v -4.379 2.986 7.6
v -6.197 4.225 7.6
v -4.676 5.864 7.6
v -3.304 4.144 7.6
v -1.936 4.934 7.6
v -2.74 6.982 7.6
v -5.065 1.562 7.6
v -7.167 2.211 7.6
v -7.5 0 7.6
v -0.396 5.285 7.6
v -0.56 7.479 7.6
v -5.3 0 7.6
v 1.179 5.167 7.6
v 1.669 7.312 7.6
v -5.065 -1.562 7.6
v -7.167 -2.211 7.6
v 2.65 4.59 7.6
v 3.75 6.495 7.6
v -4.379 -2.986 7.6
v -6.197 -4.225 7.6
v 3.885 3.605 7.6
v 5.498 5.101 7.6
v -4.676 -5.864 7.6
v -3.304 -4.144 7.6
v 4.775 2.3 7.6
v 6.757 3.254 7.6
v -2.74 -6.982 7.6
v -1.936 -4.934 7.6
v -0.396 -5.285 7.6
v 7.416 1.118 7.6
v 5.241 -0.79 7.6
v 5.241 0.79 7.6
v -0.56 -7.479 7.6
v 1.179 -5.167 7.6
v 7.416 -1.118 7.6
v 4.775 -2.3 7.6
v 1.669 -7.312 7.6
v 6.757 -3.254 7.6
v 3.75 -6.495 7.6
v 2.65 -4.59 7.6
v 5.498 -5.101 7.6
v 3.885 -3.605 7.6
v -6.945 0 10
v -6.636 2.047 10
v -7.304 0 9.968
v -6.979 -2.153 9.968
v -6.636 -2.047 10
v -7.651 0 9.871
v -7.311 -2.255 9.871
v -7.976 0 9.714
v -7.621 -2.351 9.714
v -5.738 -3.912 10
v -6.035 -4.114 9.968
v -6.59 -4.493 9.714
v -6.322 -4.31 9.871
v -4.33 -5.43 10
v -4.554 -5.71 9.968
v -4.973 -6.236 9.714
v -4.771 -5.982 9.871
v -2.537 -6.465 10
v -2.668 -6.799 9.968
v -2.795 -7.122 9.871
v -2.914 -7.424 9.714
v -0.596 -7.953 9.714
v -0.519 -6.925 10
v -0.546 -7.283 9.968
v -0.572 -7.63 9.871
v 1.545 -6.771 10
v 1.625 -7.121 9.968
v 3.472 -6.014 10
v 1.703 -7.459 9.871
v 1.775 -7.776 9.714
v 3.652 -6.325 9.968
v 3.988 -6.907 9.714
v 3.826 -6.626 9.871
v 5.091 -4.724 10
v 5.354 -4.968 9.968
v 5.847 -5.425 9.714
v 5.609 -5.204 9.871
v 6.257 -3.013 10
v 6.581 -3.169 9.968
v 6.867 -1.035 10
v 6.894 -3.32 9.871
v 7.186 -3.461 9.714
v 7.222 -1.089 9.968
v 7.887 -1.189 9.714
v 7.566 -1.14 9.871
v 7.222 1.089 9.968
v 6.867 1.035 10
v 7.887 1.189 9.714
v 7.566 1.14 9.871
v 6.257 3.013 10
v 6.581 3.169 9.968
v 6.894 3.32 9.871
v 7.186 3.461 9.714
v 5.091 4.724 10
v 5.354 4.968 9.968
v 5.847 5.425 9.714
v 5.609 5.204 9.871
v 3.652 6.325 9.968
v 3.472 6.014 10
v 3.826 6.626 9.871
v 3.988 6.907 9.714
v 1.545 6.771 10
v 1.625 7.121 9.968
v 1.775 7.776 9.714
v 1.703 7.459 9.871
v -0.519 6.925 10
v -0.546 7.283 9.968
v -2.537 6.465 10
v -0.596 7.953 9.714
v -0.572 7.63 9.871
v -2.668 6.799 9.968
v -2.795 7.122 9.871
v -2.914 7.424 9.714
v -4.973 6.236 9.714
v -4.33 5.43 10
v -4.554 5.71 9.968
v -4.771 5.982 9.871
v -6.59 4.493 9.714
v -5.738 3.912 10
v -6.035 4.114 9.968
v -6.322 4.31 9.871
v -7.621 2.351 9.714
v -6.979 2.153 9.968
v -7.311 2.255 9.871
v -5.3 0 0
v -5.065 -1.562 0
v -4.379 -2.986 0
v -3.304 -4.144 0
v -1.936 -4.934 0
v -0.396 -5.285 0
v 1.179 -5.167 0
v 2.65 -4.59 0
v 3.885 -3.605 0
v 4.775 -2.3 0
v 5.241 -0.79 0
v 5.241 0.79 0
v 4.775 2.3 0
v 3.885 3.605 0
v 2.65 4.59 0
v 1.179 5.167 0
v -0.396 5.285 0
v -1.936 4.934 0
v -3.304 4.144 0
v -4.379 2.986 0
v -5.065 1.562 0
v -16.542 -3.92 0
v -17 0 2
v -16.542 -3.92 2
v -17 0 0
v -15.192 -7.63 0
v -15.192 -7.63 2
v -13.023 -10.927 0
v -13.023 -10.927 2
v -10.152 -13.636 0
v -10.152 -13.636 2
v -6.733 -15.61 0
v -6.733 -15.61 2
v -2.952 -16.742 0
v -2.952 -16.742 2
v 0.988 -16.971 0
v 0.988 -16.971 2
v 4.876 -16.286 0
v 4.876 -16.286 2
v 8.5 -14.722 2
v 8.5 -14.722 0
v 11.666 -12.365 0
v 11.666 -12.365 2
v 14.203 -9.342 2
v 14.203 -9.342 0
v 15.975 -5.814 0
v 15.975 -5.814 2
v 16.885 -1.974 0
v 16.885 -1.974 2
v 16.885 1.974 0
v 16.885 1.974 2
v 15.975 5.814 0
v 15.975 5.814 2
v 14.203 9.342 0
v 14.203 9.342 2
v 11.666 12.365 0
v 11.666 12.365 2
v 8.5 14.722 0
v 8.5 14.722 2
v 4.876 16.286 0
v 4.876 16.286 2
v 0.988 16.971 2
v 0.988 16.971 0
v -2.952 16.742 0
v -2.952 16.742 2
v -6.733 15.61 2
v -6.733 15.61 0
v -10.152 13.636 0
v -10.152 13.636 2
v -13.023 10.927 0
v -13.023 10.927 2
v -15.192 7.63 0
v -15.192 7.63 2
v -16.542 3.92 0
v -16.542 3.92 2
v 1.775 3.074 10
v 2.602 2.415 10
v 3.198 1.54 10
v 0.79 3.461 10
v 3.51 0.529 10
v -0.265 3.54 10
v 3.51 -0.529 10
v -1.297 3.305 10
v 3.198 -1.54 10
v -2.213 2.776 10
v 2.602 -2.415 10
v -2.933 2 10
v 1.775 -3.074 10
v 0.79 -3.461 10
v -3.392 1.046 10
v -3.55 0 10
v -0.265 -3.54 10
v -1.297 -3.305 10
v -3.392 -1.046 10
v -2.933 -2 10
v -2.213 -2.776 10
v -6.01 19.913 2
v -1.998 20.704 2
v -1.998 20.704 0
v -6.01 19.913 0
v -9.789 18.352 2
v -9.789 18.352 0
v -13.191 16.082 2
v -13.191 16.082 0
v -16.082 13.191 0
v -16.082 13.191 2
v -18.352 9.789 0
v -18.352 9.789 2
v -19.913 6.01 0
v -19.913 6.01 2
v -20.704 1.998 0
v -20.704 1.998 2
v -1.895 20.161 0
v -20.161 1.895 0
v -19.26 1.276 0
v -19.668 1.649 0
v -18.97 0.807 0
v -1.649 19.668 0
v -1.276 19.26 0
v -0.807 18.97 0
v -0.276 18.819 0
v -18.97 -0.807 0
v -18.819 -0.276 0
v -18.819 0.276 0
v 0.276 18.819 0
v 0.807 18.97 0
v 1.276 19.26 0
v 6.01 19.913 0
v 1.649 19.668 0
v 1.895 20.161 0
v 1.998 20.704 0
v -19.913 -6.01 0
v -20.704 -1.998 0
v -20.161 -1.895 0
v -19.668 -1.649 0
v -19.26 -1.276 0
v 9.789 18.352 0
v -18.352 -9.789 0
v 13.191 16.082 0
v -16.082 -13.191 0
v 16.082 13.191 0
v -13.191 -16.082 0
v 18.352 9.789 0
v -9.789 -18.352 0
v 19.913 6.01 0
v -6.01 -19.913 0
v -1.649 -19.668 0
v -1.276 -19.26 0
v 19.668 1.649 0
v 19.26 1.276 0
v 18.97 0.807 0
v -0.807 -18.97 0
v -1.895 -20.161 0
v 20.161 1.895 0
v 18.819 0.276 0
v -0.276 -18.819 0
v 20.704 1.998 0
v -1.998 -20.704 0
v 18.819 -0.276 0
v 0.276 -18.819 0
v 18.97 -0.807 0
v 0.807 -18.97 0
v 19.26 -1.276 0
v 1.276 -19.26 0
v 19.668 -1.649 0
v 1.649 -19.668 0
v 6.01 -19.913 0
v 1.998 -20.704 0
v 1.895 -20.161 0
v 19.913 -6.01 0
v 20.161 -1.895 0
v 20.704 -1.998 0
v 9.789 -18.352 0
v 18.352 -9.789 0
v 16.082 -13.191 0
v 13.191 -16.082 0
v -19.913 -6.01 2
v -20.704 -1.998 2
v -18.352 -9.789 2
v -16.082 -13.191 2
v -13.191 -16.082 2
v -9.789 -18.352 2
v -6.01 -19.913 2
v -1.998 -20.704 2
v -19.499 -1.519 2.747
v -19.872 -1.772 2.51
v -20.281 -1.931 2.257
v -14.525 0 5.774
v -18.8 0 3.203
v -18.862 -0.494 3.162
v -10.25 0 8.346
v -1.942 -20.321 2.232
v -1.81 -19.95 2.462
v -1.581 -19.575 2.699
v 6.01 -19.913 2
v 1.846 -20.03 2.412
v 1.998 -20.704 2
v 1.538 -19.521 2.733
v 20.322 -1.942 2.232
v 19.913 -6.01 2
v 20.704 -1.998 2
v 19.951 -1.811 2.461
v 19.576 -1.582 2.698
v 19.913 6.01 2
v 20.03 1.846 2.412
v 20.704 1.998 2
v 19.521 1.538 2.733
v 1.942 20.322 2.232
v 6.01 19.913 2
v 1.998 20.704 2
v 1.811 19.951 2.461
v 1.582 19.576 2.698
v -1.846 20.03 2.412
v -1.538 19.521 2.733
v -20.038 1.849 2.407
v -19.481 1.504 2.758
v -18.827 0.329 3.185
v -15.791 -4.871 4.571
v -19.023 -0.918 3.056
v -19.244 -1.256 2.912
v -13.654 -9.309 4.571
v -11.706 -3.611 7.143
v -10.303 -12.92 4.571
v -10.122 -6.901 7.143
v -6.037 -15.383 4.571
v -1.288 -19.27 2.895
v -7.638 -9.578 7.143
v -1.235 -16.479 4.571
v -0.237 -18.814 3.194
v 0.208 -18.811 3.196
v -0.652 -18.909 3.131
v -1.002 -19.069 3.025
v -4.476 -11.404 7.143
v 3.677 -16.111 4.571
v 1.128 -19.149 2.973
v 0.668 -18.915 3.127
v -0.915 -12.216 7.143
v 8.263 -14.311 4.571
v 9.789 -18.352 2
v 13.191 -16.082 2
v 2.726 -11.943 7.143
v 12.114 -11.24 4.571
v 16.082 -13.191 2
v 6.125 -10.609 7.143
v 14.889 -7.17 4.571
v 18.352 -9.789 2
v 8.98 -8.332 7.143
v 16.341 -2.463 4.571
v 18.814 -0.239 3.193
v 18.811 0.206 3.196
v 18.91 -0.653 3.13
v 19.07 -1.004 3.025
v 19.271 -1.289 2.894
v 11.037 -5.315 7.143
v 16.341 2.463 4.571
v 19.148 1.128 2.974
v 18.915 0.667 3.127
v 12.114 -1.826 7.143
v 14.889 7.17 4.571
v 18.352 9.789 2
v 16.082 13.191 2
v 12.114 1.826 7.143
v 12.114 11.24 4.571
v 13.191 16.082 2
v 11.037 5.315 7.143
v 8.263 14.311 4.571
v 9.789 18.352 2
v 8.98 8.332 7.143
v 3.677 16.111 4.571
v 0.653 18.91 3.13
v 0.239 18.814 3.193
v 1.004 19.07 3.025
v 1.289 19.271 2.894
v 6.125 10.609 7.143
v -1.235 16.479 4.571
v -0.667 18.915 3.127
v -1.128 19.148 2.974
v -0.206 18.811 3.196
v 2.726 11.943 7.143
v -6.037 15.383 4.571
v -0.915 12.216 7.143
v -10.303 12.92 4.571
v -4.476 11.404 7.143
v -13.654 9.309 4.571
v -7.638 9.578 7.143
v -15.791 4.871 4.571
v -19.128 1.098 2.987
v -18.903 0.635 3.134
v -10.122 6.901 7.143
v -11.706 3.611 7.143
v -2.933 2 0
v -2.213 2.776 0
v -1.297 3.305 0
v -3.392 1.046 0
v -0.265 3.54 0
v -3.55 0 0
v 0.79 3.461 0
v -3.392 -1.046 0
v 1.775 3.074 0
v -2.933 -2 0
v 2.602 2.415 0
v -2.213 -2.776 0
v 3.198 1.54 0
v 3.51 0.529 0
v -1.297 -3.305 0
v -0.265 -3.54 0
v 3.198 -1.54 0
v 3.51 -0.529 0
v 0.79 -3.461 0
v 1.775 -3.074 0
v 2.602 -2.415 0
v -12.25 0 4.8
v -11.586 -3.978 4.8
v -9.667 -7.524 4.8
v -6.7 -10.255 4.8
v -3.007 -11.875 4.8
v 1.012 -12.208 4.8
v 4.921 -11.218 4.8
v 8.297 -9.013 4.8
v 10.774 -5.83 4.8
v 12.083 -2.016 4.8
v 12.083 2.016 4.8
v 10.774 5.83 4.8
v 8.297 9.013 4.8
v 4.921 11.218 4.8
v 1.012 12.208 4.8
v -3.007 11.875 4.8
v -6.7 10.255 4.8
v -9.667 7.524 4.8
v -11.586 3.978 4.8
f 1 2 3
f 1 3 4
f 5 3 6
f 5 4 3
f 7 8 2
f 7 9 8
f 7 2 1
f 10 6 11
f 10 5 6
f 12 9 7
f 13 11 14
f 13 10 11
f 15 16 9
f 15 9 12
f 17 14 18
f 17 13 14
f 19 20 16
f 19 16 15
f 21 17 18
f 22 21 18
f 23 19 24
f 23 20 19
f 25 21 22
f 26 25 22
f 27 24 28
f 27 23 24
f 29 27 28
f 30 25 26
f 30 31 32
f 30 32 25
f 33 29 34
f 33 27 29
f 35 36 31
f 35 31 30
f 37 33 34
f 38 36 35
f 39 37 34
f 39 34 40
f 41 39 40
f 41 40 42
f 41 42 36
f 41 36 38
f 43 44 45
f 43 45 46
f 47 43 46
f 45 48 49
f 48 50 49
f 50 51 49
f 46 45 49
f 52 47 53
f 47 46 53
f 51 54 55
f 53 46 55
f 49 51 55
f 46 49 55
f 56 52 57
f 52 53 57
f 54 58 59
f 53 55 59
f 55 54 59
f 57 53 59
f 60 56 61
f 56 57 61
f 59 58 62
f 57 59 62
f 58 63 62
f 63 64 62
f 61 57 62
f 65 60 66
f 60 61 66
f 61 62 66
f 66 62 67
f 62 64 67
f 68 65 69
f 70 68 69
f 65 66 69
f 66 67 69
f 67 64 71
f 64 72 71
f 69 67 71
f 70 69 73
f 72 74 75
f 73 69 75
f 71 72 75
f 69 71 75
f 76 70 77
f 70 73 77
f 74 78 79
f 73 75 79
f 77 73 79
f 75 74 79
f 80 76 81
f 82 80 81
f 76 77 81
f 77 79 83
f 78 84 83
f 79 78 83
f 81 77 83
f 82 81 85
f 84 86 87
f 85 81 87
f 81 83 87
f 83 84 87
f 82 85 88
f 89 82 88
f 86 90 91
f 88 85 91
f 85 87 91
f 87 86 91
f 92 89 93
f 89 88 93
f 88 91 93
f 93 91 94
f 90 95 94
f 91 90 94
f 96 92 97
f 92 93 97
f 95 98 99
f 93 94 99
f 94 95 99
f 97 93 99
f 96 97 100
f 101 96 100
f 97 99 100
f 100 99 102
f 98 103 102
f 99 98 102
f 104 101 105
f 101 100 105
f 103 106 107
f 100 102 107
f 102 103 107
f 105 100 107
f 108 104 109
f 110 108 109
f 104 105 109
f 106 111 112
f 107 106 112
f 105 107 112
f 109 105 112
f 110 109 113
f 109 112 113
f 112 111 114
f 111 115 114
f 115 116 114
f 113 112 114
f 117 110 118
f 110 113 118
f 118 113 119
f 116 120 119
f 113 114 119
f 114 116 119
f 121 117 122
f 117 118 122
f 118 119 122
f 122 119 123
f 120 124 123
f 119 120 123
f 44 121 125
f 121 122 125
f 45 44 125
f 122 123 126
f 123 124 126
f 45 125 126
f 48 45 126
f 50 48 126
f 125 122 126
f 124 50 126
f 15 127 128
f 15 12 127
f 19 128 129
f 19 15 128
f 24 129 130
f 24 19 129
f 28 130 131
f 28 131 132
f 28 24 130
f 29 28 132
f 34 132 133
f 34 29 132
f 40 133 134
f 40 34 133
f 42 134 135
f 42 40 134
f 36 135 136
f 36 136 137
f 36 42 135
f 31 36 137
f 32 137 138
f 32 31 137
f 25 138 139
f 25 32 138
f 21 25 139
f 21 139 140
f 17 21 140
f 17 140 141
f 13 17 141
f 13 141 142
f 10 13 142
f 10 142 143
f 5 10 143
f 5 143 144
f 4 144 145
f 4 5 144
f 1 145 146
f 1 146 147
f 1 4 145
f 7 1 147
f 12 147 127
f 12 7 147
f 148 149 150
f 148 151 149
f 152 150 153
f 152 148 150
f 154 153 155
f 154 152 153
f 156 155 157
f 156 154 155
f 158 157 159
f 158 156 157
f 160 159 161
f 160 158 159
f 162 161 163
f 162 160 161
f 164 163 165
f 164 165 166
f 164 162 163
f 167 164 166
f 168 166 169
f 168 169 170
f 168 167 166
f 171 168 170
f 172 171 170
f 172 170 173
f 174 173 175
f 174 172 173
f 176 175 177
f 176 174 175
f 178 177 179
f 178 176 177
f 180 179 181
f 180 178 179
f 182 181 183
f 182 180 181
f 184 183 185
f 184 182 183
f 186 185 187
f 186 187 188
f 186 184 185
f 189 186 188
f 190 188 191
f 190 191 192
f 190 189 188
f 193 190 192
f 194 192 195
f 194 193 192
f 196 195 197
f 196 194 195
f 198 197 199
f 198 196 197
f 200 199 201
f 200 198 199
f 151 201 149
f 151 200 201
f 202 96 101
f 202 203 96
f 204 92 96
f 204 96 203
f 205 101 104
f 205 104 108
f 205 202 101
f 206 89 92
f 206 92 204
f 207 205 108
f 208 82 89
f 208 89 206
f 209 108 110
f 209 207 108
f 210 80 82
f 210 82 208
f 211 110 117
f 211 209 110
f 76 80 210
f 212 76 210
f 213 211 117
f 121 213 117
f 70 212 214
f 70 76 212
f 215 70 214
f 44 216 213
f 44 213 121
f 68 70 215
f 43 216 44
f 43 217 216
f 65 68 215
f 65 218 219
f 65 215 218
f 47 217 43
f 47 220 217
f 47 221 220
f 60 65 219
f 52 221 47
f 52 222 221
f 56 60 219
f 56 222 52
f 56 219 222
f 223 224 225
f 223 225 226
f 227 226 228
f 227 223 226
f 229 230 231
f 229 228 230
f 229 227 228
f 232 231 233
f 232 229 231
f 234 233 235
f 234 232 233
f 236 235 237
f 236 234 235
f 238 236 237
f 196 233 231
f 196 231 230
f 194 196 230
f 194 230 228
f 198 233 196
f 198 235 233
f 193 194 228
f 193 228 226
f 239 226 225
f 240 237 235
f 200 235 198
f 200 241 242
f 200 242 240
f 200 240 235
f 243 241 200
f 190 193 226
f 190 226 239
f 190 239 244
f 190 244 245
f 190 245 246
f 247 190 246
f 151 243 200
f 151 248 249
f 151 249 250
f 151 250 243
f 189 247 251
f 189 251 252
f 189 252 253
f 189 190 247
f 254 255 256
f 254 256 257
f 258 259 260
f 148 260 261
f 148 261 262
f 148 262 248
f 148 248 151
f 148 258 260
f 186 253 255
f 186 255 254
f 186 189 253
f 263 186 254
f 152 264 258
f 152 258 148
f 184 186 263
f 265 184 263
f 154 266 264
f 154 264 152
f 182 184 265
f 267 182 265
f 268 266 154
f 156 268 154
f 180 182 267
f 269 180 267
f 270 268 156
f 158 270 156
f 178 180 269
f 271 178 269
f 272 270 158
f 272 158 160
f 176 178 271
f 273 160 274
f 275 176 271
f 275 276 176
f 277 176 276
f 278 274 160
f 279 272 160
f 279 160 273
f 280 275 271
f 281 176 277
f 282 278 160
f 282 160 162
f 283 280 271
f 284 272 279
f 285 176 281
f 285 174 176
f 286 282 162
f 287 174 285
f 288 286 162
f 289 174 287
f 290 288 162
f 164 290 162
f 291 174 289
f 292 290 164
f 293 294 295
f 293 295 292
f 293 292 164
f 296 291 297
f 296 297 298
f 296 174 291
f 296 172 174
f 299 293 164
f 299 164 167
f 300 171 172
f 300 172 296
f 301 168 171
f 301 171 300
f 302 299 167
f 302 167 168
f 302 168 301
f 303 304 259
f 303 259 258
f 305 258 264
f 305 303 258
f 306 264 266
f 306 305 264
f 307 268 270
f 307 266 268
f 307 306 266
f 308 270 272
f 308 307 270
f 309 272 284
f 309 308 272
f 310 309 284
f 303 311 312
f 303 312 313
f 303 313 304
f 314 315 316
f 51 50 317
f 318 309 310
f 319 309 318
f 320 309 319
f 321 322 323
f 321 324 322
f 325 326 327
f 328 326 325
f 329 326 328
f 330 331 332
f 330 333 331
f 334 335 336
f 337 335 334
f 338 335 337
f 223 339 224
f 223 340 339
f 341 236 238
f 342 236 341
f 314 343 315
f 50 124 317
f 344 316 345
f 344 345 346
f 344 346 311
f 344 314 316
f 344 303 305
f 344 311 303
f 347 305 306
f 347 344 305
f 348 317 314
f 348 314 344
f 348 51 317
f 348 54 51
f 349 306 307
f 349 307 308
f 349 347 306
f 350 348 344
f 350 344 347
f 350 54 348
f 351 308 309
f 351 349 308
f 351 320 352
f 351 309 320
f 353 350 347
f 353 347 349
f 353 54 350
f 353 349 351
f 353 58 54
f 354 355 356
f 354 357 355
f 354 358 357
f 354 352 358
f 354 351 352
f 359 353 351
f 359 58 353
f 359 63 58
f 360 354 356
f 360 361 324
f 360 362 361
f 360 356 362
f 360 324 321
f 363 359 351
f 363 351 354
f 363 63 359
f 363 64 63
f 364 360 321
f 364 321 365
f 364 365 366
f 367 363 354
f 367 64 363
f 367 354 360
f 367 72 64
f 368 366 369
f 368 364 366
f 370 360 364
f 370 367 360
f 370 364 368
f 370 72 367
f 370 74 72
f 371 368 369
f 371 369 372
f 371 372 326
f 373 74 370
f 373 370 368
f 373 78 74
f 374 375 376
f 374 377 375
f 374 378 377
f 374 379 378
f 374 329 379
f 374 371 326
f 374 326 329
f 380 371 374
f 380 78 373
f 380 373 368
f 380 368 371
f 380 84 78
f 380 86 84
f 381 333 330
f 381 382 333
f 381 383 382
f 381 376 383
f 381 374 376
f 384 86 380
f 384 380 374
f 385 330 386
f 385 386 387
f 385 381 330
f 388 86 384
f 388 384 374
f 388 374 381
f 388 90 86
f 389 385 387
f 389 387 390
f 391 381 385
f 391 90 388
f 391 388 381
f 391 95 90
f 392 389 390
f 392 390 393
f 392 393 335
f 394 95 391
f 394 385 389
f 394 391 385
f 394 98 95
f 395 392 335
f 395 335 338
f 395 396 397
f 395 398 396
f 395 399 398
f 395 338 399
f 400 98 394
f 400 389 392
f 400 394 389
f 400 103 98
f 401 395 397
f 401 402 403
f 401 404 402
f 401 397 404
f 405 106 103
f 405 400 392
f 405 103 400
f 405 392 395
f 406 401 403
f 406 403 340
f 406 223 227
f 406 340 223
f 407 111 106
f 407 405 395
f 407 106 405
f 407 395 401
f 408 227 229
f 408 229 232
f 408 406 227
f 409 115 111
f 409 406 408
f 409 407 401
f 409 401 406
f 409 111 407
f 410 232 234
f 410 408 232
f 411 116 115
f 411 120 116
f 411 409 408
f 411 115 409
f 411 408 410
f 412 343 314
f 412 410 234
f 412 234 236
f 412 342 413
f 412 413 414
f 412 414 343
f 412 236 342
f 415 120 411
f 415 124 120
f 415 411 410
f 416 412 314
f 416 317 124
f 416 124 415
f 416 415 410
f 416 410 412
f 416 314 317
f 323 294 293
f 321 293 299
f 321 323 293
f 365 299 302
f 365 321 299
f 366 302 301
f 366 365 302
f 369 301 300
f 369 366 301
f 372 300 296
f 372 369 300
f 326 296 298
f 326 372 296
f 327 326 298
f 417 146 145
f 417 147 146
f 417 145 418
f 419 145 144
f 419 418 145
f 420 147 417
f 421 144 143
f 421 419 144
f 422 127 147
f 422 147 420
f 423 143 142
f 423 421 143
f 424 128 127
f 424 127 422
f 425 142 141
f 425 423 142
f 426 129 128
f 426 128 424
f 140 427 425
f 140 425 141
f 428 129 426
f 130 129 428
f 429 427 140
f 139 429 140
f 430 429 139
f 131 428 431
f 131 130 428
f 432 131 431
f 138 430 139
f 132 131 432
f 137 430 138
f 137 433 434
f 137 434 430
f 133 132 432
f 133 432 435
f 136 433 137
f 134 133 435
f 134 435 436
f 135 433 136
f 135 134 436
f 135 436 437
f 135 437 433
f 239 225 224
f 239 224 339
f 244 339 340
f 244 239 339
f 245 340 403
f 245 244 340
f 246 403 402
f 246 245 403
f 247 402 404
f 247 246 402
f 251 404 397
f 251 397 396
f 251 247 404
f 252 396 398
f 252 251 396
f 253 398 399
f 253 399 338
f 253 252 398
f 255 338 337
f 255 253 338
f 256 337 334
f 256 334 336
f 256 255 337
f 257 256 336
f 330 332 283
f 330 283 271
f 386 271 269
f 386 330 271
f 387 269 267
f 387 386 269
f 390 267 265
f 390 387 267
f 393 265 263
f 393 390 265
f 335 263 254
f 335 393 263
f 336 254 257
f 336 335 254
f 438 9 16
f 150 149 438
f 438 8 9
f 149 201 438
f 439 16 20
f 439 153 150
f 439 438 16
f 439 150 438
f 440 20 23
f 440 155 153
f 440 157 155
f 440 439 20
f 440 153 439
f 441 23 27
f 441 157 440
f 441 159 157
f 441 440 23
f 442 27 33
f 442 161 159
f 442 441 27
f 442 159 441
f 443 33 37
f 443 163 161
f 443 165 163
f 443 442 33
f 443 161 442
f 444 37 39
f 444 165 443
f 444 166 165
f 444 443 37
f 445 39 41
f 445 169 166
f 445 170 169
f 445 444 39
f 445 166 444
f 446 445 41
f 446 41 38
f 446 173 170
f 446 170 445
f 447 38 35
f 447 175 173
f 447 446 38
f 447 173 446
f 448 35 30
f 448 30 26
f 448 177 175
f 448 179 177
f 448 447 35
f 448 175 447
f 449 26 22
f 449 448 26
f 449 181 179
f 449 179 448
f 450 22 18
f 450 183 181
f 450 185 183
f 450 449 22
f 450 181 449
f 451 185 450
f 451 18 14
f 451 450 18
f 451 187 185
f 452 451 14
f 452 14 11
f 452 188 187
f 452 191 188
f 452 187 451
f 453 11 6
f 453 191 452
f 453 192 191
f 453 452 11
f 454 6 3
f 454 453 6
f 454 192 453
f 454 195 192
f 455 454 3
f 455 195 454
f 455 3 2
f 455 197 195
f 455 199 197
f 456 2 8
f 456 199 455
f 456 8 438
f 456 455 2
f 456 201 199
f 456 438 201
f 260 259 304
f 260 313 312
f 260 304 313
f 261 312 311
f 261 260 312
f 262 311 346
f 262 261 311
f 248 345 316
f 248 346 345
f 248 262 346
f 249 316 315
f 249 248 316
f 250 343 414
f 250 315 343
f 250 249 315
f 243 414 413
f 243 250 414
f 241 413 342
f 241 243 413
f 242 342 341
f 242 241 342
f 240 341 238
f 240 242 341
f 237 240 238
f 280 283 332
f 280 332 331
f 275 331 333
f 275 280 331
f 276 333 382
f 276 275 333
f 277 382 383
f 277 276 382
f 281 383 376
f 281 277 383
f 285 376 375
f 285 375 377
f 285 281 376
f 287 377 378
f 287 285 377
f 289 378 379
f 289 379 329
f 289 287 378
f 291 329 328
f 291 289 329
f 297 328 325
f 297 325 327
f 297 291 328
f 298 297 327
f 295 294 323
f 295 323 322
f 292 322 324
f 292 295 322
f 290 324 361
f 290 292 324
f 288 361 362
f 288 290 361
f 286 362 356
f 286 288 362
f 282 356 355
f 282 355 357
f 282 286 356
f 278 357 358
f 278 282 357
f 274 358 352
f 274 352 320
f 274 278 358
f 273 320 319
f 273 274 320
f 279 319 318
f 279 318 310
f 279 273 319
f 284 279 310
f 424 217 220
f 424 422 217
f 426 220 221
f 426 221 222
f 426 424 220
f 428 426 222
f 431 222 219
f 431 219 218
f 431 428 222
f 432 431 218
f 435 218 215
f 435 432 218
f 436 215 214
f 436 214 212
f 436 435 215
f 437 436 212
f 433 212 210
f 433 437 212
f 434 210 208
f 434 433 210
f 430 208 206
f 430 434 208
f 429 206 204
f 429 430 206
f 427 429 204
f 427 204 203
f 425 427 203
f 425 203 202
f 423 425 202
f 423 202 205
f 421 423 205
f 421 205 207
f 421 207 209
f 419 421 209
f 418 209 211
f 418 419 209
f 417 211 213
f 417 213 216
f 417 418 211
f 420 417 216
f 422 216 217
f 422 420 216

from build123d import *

# Parameters (mm, degrees)
CUT_EXTRUDE1_REACH = 33.069
SKETCH3_R          = 2
FILLET1_R          = 2


with BuildPart() as part:
    # Sketch2 → Revolve1 (revolve)
    with BuildSketch(Plane(origin=(0, 0, 0), x_dir=(0, 0, -1), z_dir=(1, 0, 0)), mode=Mode.PRIVATE) as revolve1_sk:
        Polygon((0, 17), (0, 20.8), (-2, 20.8), (-10, 7.5), (-10, 3.55), (0, 3.55), (0, 5.3), (-7.6, 5.3), (-7.6, 7.5), (-2, 17), align=None)
    revolve(revolve1_sk.sketch.rotate(Axis((0, 0, 0), (0, 0, 1)), 90), axis=Axis((0, 0, 0), (0, 0, 1)))

    # Cut-Extrude1: up to this cone (the profile starts inside it)
    cut_extrude1_end = Plane(origin=(0, 0, 0), z_dir=(0, 0, -1)).offset(-14.511277195) * Cone(1.663e-06, 120.041275, 72.205277195, align=(Align.CENTER, Align.CENTER, Align.MIN), mode=Mode.PRIVATE)
    # Sketch3 → Cut-Extrude1 (cut, up to the surface)
    with BuildSketch(Plane.XY, mode=Mode.PRIVATE) as cut_extrude1_sk1:
        with Locations((0, 20.8)):
            Circle(SKETCH3_R)
    cut_extrude1_tool1 = extrude(cut_extrude1_sk1.sketch, amount=CUT_EXTRUDE1_REACH, mode=Mode.PRIVATE) & cut_extrude1_end
    add(cut_extrude1_tool1.solids().sort_by_distance((0, 20.8, 0))[0], mode=Mode.SUBTRACT)
    # Sketch3 → Cut-Extrude1 (cut, up to the surface)
    with BuildSketch(Plane.XY, mode=Mode.PRIVATE) as cut_extrude1_sk2:
        with Locations((20.8, 0)):
            Circle(SKETCH3_R)
    cut_extrude1_tool2 = extrude(cut_extrude1_sk2.sketch, amount=CUT_EXTRUDE1_REACH, mode=Mode.PRIVATE) & cut_extrude1_end
    add(cut_extrude1_tool2.solids().sort_by_distance((20.8, 0, 0))[0], mode=Mode.SUBTRACT)
    # Sketch3 → Cut-Extrude1 (cut, up to the surface)
    with BuildSketch(Plane.XY, mode=Mode.PRIVATE) as cut_extrude1_sk3:
        with Locations((0, -20.8)):
            Circle(SKETCH3_R)
    cut_extrude1_tool3 = extrude(cut_extrude1_sk3.sketch, amount=CUT_EXTRUDE1_REACH, mode=Mode.PRIVATE) & cut_extrude1_end
    add(cut_extrude1_tool3.solids().sort_by_distance((0, -20.8, 0))[0], mode=Mode.SUBTRACT)
    # Sketch3 → Cut-Extrude1 (cut, up to the surface)
    with BuildSketch(Plane.XY, mode=Mode.PRIVATE) as cut_extrude1_sk4:
        with Locations((-20.8, 0)):
            Circle(SKETCH3_R)
    cut_extrude1_tool4 = extrude(cut_extrude1_sk4.sketch, amount=CUT_EXTRUDE1_REACH, mode=Mode.PRIVATE) & cut_extrude1_end
    add(cut_extrude1_tool4.solids().sort_by_distance((-20.8, 0, 0))[0], mode=Mode.SUBTRACT)

    # Fillet1
    fillet1_edges = [part.edges().sort_by_distance(p)[0] for p in [
        (7.5, 0, 10),
    ]]
    fillet(fillet1_edges, radius=FILLET1_R)


solid = part.part
